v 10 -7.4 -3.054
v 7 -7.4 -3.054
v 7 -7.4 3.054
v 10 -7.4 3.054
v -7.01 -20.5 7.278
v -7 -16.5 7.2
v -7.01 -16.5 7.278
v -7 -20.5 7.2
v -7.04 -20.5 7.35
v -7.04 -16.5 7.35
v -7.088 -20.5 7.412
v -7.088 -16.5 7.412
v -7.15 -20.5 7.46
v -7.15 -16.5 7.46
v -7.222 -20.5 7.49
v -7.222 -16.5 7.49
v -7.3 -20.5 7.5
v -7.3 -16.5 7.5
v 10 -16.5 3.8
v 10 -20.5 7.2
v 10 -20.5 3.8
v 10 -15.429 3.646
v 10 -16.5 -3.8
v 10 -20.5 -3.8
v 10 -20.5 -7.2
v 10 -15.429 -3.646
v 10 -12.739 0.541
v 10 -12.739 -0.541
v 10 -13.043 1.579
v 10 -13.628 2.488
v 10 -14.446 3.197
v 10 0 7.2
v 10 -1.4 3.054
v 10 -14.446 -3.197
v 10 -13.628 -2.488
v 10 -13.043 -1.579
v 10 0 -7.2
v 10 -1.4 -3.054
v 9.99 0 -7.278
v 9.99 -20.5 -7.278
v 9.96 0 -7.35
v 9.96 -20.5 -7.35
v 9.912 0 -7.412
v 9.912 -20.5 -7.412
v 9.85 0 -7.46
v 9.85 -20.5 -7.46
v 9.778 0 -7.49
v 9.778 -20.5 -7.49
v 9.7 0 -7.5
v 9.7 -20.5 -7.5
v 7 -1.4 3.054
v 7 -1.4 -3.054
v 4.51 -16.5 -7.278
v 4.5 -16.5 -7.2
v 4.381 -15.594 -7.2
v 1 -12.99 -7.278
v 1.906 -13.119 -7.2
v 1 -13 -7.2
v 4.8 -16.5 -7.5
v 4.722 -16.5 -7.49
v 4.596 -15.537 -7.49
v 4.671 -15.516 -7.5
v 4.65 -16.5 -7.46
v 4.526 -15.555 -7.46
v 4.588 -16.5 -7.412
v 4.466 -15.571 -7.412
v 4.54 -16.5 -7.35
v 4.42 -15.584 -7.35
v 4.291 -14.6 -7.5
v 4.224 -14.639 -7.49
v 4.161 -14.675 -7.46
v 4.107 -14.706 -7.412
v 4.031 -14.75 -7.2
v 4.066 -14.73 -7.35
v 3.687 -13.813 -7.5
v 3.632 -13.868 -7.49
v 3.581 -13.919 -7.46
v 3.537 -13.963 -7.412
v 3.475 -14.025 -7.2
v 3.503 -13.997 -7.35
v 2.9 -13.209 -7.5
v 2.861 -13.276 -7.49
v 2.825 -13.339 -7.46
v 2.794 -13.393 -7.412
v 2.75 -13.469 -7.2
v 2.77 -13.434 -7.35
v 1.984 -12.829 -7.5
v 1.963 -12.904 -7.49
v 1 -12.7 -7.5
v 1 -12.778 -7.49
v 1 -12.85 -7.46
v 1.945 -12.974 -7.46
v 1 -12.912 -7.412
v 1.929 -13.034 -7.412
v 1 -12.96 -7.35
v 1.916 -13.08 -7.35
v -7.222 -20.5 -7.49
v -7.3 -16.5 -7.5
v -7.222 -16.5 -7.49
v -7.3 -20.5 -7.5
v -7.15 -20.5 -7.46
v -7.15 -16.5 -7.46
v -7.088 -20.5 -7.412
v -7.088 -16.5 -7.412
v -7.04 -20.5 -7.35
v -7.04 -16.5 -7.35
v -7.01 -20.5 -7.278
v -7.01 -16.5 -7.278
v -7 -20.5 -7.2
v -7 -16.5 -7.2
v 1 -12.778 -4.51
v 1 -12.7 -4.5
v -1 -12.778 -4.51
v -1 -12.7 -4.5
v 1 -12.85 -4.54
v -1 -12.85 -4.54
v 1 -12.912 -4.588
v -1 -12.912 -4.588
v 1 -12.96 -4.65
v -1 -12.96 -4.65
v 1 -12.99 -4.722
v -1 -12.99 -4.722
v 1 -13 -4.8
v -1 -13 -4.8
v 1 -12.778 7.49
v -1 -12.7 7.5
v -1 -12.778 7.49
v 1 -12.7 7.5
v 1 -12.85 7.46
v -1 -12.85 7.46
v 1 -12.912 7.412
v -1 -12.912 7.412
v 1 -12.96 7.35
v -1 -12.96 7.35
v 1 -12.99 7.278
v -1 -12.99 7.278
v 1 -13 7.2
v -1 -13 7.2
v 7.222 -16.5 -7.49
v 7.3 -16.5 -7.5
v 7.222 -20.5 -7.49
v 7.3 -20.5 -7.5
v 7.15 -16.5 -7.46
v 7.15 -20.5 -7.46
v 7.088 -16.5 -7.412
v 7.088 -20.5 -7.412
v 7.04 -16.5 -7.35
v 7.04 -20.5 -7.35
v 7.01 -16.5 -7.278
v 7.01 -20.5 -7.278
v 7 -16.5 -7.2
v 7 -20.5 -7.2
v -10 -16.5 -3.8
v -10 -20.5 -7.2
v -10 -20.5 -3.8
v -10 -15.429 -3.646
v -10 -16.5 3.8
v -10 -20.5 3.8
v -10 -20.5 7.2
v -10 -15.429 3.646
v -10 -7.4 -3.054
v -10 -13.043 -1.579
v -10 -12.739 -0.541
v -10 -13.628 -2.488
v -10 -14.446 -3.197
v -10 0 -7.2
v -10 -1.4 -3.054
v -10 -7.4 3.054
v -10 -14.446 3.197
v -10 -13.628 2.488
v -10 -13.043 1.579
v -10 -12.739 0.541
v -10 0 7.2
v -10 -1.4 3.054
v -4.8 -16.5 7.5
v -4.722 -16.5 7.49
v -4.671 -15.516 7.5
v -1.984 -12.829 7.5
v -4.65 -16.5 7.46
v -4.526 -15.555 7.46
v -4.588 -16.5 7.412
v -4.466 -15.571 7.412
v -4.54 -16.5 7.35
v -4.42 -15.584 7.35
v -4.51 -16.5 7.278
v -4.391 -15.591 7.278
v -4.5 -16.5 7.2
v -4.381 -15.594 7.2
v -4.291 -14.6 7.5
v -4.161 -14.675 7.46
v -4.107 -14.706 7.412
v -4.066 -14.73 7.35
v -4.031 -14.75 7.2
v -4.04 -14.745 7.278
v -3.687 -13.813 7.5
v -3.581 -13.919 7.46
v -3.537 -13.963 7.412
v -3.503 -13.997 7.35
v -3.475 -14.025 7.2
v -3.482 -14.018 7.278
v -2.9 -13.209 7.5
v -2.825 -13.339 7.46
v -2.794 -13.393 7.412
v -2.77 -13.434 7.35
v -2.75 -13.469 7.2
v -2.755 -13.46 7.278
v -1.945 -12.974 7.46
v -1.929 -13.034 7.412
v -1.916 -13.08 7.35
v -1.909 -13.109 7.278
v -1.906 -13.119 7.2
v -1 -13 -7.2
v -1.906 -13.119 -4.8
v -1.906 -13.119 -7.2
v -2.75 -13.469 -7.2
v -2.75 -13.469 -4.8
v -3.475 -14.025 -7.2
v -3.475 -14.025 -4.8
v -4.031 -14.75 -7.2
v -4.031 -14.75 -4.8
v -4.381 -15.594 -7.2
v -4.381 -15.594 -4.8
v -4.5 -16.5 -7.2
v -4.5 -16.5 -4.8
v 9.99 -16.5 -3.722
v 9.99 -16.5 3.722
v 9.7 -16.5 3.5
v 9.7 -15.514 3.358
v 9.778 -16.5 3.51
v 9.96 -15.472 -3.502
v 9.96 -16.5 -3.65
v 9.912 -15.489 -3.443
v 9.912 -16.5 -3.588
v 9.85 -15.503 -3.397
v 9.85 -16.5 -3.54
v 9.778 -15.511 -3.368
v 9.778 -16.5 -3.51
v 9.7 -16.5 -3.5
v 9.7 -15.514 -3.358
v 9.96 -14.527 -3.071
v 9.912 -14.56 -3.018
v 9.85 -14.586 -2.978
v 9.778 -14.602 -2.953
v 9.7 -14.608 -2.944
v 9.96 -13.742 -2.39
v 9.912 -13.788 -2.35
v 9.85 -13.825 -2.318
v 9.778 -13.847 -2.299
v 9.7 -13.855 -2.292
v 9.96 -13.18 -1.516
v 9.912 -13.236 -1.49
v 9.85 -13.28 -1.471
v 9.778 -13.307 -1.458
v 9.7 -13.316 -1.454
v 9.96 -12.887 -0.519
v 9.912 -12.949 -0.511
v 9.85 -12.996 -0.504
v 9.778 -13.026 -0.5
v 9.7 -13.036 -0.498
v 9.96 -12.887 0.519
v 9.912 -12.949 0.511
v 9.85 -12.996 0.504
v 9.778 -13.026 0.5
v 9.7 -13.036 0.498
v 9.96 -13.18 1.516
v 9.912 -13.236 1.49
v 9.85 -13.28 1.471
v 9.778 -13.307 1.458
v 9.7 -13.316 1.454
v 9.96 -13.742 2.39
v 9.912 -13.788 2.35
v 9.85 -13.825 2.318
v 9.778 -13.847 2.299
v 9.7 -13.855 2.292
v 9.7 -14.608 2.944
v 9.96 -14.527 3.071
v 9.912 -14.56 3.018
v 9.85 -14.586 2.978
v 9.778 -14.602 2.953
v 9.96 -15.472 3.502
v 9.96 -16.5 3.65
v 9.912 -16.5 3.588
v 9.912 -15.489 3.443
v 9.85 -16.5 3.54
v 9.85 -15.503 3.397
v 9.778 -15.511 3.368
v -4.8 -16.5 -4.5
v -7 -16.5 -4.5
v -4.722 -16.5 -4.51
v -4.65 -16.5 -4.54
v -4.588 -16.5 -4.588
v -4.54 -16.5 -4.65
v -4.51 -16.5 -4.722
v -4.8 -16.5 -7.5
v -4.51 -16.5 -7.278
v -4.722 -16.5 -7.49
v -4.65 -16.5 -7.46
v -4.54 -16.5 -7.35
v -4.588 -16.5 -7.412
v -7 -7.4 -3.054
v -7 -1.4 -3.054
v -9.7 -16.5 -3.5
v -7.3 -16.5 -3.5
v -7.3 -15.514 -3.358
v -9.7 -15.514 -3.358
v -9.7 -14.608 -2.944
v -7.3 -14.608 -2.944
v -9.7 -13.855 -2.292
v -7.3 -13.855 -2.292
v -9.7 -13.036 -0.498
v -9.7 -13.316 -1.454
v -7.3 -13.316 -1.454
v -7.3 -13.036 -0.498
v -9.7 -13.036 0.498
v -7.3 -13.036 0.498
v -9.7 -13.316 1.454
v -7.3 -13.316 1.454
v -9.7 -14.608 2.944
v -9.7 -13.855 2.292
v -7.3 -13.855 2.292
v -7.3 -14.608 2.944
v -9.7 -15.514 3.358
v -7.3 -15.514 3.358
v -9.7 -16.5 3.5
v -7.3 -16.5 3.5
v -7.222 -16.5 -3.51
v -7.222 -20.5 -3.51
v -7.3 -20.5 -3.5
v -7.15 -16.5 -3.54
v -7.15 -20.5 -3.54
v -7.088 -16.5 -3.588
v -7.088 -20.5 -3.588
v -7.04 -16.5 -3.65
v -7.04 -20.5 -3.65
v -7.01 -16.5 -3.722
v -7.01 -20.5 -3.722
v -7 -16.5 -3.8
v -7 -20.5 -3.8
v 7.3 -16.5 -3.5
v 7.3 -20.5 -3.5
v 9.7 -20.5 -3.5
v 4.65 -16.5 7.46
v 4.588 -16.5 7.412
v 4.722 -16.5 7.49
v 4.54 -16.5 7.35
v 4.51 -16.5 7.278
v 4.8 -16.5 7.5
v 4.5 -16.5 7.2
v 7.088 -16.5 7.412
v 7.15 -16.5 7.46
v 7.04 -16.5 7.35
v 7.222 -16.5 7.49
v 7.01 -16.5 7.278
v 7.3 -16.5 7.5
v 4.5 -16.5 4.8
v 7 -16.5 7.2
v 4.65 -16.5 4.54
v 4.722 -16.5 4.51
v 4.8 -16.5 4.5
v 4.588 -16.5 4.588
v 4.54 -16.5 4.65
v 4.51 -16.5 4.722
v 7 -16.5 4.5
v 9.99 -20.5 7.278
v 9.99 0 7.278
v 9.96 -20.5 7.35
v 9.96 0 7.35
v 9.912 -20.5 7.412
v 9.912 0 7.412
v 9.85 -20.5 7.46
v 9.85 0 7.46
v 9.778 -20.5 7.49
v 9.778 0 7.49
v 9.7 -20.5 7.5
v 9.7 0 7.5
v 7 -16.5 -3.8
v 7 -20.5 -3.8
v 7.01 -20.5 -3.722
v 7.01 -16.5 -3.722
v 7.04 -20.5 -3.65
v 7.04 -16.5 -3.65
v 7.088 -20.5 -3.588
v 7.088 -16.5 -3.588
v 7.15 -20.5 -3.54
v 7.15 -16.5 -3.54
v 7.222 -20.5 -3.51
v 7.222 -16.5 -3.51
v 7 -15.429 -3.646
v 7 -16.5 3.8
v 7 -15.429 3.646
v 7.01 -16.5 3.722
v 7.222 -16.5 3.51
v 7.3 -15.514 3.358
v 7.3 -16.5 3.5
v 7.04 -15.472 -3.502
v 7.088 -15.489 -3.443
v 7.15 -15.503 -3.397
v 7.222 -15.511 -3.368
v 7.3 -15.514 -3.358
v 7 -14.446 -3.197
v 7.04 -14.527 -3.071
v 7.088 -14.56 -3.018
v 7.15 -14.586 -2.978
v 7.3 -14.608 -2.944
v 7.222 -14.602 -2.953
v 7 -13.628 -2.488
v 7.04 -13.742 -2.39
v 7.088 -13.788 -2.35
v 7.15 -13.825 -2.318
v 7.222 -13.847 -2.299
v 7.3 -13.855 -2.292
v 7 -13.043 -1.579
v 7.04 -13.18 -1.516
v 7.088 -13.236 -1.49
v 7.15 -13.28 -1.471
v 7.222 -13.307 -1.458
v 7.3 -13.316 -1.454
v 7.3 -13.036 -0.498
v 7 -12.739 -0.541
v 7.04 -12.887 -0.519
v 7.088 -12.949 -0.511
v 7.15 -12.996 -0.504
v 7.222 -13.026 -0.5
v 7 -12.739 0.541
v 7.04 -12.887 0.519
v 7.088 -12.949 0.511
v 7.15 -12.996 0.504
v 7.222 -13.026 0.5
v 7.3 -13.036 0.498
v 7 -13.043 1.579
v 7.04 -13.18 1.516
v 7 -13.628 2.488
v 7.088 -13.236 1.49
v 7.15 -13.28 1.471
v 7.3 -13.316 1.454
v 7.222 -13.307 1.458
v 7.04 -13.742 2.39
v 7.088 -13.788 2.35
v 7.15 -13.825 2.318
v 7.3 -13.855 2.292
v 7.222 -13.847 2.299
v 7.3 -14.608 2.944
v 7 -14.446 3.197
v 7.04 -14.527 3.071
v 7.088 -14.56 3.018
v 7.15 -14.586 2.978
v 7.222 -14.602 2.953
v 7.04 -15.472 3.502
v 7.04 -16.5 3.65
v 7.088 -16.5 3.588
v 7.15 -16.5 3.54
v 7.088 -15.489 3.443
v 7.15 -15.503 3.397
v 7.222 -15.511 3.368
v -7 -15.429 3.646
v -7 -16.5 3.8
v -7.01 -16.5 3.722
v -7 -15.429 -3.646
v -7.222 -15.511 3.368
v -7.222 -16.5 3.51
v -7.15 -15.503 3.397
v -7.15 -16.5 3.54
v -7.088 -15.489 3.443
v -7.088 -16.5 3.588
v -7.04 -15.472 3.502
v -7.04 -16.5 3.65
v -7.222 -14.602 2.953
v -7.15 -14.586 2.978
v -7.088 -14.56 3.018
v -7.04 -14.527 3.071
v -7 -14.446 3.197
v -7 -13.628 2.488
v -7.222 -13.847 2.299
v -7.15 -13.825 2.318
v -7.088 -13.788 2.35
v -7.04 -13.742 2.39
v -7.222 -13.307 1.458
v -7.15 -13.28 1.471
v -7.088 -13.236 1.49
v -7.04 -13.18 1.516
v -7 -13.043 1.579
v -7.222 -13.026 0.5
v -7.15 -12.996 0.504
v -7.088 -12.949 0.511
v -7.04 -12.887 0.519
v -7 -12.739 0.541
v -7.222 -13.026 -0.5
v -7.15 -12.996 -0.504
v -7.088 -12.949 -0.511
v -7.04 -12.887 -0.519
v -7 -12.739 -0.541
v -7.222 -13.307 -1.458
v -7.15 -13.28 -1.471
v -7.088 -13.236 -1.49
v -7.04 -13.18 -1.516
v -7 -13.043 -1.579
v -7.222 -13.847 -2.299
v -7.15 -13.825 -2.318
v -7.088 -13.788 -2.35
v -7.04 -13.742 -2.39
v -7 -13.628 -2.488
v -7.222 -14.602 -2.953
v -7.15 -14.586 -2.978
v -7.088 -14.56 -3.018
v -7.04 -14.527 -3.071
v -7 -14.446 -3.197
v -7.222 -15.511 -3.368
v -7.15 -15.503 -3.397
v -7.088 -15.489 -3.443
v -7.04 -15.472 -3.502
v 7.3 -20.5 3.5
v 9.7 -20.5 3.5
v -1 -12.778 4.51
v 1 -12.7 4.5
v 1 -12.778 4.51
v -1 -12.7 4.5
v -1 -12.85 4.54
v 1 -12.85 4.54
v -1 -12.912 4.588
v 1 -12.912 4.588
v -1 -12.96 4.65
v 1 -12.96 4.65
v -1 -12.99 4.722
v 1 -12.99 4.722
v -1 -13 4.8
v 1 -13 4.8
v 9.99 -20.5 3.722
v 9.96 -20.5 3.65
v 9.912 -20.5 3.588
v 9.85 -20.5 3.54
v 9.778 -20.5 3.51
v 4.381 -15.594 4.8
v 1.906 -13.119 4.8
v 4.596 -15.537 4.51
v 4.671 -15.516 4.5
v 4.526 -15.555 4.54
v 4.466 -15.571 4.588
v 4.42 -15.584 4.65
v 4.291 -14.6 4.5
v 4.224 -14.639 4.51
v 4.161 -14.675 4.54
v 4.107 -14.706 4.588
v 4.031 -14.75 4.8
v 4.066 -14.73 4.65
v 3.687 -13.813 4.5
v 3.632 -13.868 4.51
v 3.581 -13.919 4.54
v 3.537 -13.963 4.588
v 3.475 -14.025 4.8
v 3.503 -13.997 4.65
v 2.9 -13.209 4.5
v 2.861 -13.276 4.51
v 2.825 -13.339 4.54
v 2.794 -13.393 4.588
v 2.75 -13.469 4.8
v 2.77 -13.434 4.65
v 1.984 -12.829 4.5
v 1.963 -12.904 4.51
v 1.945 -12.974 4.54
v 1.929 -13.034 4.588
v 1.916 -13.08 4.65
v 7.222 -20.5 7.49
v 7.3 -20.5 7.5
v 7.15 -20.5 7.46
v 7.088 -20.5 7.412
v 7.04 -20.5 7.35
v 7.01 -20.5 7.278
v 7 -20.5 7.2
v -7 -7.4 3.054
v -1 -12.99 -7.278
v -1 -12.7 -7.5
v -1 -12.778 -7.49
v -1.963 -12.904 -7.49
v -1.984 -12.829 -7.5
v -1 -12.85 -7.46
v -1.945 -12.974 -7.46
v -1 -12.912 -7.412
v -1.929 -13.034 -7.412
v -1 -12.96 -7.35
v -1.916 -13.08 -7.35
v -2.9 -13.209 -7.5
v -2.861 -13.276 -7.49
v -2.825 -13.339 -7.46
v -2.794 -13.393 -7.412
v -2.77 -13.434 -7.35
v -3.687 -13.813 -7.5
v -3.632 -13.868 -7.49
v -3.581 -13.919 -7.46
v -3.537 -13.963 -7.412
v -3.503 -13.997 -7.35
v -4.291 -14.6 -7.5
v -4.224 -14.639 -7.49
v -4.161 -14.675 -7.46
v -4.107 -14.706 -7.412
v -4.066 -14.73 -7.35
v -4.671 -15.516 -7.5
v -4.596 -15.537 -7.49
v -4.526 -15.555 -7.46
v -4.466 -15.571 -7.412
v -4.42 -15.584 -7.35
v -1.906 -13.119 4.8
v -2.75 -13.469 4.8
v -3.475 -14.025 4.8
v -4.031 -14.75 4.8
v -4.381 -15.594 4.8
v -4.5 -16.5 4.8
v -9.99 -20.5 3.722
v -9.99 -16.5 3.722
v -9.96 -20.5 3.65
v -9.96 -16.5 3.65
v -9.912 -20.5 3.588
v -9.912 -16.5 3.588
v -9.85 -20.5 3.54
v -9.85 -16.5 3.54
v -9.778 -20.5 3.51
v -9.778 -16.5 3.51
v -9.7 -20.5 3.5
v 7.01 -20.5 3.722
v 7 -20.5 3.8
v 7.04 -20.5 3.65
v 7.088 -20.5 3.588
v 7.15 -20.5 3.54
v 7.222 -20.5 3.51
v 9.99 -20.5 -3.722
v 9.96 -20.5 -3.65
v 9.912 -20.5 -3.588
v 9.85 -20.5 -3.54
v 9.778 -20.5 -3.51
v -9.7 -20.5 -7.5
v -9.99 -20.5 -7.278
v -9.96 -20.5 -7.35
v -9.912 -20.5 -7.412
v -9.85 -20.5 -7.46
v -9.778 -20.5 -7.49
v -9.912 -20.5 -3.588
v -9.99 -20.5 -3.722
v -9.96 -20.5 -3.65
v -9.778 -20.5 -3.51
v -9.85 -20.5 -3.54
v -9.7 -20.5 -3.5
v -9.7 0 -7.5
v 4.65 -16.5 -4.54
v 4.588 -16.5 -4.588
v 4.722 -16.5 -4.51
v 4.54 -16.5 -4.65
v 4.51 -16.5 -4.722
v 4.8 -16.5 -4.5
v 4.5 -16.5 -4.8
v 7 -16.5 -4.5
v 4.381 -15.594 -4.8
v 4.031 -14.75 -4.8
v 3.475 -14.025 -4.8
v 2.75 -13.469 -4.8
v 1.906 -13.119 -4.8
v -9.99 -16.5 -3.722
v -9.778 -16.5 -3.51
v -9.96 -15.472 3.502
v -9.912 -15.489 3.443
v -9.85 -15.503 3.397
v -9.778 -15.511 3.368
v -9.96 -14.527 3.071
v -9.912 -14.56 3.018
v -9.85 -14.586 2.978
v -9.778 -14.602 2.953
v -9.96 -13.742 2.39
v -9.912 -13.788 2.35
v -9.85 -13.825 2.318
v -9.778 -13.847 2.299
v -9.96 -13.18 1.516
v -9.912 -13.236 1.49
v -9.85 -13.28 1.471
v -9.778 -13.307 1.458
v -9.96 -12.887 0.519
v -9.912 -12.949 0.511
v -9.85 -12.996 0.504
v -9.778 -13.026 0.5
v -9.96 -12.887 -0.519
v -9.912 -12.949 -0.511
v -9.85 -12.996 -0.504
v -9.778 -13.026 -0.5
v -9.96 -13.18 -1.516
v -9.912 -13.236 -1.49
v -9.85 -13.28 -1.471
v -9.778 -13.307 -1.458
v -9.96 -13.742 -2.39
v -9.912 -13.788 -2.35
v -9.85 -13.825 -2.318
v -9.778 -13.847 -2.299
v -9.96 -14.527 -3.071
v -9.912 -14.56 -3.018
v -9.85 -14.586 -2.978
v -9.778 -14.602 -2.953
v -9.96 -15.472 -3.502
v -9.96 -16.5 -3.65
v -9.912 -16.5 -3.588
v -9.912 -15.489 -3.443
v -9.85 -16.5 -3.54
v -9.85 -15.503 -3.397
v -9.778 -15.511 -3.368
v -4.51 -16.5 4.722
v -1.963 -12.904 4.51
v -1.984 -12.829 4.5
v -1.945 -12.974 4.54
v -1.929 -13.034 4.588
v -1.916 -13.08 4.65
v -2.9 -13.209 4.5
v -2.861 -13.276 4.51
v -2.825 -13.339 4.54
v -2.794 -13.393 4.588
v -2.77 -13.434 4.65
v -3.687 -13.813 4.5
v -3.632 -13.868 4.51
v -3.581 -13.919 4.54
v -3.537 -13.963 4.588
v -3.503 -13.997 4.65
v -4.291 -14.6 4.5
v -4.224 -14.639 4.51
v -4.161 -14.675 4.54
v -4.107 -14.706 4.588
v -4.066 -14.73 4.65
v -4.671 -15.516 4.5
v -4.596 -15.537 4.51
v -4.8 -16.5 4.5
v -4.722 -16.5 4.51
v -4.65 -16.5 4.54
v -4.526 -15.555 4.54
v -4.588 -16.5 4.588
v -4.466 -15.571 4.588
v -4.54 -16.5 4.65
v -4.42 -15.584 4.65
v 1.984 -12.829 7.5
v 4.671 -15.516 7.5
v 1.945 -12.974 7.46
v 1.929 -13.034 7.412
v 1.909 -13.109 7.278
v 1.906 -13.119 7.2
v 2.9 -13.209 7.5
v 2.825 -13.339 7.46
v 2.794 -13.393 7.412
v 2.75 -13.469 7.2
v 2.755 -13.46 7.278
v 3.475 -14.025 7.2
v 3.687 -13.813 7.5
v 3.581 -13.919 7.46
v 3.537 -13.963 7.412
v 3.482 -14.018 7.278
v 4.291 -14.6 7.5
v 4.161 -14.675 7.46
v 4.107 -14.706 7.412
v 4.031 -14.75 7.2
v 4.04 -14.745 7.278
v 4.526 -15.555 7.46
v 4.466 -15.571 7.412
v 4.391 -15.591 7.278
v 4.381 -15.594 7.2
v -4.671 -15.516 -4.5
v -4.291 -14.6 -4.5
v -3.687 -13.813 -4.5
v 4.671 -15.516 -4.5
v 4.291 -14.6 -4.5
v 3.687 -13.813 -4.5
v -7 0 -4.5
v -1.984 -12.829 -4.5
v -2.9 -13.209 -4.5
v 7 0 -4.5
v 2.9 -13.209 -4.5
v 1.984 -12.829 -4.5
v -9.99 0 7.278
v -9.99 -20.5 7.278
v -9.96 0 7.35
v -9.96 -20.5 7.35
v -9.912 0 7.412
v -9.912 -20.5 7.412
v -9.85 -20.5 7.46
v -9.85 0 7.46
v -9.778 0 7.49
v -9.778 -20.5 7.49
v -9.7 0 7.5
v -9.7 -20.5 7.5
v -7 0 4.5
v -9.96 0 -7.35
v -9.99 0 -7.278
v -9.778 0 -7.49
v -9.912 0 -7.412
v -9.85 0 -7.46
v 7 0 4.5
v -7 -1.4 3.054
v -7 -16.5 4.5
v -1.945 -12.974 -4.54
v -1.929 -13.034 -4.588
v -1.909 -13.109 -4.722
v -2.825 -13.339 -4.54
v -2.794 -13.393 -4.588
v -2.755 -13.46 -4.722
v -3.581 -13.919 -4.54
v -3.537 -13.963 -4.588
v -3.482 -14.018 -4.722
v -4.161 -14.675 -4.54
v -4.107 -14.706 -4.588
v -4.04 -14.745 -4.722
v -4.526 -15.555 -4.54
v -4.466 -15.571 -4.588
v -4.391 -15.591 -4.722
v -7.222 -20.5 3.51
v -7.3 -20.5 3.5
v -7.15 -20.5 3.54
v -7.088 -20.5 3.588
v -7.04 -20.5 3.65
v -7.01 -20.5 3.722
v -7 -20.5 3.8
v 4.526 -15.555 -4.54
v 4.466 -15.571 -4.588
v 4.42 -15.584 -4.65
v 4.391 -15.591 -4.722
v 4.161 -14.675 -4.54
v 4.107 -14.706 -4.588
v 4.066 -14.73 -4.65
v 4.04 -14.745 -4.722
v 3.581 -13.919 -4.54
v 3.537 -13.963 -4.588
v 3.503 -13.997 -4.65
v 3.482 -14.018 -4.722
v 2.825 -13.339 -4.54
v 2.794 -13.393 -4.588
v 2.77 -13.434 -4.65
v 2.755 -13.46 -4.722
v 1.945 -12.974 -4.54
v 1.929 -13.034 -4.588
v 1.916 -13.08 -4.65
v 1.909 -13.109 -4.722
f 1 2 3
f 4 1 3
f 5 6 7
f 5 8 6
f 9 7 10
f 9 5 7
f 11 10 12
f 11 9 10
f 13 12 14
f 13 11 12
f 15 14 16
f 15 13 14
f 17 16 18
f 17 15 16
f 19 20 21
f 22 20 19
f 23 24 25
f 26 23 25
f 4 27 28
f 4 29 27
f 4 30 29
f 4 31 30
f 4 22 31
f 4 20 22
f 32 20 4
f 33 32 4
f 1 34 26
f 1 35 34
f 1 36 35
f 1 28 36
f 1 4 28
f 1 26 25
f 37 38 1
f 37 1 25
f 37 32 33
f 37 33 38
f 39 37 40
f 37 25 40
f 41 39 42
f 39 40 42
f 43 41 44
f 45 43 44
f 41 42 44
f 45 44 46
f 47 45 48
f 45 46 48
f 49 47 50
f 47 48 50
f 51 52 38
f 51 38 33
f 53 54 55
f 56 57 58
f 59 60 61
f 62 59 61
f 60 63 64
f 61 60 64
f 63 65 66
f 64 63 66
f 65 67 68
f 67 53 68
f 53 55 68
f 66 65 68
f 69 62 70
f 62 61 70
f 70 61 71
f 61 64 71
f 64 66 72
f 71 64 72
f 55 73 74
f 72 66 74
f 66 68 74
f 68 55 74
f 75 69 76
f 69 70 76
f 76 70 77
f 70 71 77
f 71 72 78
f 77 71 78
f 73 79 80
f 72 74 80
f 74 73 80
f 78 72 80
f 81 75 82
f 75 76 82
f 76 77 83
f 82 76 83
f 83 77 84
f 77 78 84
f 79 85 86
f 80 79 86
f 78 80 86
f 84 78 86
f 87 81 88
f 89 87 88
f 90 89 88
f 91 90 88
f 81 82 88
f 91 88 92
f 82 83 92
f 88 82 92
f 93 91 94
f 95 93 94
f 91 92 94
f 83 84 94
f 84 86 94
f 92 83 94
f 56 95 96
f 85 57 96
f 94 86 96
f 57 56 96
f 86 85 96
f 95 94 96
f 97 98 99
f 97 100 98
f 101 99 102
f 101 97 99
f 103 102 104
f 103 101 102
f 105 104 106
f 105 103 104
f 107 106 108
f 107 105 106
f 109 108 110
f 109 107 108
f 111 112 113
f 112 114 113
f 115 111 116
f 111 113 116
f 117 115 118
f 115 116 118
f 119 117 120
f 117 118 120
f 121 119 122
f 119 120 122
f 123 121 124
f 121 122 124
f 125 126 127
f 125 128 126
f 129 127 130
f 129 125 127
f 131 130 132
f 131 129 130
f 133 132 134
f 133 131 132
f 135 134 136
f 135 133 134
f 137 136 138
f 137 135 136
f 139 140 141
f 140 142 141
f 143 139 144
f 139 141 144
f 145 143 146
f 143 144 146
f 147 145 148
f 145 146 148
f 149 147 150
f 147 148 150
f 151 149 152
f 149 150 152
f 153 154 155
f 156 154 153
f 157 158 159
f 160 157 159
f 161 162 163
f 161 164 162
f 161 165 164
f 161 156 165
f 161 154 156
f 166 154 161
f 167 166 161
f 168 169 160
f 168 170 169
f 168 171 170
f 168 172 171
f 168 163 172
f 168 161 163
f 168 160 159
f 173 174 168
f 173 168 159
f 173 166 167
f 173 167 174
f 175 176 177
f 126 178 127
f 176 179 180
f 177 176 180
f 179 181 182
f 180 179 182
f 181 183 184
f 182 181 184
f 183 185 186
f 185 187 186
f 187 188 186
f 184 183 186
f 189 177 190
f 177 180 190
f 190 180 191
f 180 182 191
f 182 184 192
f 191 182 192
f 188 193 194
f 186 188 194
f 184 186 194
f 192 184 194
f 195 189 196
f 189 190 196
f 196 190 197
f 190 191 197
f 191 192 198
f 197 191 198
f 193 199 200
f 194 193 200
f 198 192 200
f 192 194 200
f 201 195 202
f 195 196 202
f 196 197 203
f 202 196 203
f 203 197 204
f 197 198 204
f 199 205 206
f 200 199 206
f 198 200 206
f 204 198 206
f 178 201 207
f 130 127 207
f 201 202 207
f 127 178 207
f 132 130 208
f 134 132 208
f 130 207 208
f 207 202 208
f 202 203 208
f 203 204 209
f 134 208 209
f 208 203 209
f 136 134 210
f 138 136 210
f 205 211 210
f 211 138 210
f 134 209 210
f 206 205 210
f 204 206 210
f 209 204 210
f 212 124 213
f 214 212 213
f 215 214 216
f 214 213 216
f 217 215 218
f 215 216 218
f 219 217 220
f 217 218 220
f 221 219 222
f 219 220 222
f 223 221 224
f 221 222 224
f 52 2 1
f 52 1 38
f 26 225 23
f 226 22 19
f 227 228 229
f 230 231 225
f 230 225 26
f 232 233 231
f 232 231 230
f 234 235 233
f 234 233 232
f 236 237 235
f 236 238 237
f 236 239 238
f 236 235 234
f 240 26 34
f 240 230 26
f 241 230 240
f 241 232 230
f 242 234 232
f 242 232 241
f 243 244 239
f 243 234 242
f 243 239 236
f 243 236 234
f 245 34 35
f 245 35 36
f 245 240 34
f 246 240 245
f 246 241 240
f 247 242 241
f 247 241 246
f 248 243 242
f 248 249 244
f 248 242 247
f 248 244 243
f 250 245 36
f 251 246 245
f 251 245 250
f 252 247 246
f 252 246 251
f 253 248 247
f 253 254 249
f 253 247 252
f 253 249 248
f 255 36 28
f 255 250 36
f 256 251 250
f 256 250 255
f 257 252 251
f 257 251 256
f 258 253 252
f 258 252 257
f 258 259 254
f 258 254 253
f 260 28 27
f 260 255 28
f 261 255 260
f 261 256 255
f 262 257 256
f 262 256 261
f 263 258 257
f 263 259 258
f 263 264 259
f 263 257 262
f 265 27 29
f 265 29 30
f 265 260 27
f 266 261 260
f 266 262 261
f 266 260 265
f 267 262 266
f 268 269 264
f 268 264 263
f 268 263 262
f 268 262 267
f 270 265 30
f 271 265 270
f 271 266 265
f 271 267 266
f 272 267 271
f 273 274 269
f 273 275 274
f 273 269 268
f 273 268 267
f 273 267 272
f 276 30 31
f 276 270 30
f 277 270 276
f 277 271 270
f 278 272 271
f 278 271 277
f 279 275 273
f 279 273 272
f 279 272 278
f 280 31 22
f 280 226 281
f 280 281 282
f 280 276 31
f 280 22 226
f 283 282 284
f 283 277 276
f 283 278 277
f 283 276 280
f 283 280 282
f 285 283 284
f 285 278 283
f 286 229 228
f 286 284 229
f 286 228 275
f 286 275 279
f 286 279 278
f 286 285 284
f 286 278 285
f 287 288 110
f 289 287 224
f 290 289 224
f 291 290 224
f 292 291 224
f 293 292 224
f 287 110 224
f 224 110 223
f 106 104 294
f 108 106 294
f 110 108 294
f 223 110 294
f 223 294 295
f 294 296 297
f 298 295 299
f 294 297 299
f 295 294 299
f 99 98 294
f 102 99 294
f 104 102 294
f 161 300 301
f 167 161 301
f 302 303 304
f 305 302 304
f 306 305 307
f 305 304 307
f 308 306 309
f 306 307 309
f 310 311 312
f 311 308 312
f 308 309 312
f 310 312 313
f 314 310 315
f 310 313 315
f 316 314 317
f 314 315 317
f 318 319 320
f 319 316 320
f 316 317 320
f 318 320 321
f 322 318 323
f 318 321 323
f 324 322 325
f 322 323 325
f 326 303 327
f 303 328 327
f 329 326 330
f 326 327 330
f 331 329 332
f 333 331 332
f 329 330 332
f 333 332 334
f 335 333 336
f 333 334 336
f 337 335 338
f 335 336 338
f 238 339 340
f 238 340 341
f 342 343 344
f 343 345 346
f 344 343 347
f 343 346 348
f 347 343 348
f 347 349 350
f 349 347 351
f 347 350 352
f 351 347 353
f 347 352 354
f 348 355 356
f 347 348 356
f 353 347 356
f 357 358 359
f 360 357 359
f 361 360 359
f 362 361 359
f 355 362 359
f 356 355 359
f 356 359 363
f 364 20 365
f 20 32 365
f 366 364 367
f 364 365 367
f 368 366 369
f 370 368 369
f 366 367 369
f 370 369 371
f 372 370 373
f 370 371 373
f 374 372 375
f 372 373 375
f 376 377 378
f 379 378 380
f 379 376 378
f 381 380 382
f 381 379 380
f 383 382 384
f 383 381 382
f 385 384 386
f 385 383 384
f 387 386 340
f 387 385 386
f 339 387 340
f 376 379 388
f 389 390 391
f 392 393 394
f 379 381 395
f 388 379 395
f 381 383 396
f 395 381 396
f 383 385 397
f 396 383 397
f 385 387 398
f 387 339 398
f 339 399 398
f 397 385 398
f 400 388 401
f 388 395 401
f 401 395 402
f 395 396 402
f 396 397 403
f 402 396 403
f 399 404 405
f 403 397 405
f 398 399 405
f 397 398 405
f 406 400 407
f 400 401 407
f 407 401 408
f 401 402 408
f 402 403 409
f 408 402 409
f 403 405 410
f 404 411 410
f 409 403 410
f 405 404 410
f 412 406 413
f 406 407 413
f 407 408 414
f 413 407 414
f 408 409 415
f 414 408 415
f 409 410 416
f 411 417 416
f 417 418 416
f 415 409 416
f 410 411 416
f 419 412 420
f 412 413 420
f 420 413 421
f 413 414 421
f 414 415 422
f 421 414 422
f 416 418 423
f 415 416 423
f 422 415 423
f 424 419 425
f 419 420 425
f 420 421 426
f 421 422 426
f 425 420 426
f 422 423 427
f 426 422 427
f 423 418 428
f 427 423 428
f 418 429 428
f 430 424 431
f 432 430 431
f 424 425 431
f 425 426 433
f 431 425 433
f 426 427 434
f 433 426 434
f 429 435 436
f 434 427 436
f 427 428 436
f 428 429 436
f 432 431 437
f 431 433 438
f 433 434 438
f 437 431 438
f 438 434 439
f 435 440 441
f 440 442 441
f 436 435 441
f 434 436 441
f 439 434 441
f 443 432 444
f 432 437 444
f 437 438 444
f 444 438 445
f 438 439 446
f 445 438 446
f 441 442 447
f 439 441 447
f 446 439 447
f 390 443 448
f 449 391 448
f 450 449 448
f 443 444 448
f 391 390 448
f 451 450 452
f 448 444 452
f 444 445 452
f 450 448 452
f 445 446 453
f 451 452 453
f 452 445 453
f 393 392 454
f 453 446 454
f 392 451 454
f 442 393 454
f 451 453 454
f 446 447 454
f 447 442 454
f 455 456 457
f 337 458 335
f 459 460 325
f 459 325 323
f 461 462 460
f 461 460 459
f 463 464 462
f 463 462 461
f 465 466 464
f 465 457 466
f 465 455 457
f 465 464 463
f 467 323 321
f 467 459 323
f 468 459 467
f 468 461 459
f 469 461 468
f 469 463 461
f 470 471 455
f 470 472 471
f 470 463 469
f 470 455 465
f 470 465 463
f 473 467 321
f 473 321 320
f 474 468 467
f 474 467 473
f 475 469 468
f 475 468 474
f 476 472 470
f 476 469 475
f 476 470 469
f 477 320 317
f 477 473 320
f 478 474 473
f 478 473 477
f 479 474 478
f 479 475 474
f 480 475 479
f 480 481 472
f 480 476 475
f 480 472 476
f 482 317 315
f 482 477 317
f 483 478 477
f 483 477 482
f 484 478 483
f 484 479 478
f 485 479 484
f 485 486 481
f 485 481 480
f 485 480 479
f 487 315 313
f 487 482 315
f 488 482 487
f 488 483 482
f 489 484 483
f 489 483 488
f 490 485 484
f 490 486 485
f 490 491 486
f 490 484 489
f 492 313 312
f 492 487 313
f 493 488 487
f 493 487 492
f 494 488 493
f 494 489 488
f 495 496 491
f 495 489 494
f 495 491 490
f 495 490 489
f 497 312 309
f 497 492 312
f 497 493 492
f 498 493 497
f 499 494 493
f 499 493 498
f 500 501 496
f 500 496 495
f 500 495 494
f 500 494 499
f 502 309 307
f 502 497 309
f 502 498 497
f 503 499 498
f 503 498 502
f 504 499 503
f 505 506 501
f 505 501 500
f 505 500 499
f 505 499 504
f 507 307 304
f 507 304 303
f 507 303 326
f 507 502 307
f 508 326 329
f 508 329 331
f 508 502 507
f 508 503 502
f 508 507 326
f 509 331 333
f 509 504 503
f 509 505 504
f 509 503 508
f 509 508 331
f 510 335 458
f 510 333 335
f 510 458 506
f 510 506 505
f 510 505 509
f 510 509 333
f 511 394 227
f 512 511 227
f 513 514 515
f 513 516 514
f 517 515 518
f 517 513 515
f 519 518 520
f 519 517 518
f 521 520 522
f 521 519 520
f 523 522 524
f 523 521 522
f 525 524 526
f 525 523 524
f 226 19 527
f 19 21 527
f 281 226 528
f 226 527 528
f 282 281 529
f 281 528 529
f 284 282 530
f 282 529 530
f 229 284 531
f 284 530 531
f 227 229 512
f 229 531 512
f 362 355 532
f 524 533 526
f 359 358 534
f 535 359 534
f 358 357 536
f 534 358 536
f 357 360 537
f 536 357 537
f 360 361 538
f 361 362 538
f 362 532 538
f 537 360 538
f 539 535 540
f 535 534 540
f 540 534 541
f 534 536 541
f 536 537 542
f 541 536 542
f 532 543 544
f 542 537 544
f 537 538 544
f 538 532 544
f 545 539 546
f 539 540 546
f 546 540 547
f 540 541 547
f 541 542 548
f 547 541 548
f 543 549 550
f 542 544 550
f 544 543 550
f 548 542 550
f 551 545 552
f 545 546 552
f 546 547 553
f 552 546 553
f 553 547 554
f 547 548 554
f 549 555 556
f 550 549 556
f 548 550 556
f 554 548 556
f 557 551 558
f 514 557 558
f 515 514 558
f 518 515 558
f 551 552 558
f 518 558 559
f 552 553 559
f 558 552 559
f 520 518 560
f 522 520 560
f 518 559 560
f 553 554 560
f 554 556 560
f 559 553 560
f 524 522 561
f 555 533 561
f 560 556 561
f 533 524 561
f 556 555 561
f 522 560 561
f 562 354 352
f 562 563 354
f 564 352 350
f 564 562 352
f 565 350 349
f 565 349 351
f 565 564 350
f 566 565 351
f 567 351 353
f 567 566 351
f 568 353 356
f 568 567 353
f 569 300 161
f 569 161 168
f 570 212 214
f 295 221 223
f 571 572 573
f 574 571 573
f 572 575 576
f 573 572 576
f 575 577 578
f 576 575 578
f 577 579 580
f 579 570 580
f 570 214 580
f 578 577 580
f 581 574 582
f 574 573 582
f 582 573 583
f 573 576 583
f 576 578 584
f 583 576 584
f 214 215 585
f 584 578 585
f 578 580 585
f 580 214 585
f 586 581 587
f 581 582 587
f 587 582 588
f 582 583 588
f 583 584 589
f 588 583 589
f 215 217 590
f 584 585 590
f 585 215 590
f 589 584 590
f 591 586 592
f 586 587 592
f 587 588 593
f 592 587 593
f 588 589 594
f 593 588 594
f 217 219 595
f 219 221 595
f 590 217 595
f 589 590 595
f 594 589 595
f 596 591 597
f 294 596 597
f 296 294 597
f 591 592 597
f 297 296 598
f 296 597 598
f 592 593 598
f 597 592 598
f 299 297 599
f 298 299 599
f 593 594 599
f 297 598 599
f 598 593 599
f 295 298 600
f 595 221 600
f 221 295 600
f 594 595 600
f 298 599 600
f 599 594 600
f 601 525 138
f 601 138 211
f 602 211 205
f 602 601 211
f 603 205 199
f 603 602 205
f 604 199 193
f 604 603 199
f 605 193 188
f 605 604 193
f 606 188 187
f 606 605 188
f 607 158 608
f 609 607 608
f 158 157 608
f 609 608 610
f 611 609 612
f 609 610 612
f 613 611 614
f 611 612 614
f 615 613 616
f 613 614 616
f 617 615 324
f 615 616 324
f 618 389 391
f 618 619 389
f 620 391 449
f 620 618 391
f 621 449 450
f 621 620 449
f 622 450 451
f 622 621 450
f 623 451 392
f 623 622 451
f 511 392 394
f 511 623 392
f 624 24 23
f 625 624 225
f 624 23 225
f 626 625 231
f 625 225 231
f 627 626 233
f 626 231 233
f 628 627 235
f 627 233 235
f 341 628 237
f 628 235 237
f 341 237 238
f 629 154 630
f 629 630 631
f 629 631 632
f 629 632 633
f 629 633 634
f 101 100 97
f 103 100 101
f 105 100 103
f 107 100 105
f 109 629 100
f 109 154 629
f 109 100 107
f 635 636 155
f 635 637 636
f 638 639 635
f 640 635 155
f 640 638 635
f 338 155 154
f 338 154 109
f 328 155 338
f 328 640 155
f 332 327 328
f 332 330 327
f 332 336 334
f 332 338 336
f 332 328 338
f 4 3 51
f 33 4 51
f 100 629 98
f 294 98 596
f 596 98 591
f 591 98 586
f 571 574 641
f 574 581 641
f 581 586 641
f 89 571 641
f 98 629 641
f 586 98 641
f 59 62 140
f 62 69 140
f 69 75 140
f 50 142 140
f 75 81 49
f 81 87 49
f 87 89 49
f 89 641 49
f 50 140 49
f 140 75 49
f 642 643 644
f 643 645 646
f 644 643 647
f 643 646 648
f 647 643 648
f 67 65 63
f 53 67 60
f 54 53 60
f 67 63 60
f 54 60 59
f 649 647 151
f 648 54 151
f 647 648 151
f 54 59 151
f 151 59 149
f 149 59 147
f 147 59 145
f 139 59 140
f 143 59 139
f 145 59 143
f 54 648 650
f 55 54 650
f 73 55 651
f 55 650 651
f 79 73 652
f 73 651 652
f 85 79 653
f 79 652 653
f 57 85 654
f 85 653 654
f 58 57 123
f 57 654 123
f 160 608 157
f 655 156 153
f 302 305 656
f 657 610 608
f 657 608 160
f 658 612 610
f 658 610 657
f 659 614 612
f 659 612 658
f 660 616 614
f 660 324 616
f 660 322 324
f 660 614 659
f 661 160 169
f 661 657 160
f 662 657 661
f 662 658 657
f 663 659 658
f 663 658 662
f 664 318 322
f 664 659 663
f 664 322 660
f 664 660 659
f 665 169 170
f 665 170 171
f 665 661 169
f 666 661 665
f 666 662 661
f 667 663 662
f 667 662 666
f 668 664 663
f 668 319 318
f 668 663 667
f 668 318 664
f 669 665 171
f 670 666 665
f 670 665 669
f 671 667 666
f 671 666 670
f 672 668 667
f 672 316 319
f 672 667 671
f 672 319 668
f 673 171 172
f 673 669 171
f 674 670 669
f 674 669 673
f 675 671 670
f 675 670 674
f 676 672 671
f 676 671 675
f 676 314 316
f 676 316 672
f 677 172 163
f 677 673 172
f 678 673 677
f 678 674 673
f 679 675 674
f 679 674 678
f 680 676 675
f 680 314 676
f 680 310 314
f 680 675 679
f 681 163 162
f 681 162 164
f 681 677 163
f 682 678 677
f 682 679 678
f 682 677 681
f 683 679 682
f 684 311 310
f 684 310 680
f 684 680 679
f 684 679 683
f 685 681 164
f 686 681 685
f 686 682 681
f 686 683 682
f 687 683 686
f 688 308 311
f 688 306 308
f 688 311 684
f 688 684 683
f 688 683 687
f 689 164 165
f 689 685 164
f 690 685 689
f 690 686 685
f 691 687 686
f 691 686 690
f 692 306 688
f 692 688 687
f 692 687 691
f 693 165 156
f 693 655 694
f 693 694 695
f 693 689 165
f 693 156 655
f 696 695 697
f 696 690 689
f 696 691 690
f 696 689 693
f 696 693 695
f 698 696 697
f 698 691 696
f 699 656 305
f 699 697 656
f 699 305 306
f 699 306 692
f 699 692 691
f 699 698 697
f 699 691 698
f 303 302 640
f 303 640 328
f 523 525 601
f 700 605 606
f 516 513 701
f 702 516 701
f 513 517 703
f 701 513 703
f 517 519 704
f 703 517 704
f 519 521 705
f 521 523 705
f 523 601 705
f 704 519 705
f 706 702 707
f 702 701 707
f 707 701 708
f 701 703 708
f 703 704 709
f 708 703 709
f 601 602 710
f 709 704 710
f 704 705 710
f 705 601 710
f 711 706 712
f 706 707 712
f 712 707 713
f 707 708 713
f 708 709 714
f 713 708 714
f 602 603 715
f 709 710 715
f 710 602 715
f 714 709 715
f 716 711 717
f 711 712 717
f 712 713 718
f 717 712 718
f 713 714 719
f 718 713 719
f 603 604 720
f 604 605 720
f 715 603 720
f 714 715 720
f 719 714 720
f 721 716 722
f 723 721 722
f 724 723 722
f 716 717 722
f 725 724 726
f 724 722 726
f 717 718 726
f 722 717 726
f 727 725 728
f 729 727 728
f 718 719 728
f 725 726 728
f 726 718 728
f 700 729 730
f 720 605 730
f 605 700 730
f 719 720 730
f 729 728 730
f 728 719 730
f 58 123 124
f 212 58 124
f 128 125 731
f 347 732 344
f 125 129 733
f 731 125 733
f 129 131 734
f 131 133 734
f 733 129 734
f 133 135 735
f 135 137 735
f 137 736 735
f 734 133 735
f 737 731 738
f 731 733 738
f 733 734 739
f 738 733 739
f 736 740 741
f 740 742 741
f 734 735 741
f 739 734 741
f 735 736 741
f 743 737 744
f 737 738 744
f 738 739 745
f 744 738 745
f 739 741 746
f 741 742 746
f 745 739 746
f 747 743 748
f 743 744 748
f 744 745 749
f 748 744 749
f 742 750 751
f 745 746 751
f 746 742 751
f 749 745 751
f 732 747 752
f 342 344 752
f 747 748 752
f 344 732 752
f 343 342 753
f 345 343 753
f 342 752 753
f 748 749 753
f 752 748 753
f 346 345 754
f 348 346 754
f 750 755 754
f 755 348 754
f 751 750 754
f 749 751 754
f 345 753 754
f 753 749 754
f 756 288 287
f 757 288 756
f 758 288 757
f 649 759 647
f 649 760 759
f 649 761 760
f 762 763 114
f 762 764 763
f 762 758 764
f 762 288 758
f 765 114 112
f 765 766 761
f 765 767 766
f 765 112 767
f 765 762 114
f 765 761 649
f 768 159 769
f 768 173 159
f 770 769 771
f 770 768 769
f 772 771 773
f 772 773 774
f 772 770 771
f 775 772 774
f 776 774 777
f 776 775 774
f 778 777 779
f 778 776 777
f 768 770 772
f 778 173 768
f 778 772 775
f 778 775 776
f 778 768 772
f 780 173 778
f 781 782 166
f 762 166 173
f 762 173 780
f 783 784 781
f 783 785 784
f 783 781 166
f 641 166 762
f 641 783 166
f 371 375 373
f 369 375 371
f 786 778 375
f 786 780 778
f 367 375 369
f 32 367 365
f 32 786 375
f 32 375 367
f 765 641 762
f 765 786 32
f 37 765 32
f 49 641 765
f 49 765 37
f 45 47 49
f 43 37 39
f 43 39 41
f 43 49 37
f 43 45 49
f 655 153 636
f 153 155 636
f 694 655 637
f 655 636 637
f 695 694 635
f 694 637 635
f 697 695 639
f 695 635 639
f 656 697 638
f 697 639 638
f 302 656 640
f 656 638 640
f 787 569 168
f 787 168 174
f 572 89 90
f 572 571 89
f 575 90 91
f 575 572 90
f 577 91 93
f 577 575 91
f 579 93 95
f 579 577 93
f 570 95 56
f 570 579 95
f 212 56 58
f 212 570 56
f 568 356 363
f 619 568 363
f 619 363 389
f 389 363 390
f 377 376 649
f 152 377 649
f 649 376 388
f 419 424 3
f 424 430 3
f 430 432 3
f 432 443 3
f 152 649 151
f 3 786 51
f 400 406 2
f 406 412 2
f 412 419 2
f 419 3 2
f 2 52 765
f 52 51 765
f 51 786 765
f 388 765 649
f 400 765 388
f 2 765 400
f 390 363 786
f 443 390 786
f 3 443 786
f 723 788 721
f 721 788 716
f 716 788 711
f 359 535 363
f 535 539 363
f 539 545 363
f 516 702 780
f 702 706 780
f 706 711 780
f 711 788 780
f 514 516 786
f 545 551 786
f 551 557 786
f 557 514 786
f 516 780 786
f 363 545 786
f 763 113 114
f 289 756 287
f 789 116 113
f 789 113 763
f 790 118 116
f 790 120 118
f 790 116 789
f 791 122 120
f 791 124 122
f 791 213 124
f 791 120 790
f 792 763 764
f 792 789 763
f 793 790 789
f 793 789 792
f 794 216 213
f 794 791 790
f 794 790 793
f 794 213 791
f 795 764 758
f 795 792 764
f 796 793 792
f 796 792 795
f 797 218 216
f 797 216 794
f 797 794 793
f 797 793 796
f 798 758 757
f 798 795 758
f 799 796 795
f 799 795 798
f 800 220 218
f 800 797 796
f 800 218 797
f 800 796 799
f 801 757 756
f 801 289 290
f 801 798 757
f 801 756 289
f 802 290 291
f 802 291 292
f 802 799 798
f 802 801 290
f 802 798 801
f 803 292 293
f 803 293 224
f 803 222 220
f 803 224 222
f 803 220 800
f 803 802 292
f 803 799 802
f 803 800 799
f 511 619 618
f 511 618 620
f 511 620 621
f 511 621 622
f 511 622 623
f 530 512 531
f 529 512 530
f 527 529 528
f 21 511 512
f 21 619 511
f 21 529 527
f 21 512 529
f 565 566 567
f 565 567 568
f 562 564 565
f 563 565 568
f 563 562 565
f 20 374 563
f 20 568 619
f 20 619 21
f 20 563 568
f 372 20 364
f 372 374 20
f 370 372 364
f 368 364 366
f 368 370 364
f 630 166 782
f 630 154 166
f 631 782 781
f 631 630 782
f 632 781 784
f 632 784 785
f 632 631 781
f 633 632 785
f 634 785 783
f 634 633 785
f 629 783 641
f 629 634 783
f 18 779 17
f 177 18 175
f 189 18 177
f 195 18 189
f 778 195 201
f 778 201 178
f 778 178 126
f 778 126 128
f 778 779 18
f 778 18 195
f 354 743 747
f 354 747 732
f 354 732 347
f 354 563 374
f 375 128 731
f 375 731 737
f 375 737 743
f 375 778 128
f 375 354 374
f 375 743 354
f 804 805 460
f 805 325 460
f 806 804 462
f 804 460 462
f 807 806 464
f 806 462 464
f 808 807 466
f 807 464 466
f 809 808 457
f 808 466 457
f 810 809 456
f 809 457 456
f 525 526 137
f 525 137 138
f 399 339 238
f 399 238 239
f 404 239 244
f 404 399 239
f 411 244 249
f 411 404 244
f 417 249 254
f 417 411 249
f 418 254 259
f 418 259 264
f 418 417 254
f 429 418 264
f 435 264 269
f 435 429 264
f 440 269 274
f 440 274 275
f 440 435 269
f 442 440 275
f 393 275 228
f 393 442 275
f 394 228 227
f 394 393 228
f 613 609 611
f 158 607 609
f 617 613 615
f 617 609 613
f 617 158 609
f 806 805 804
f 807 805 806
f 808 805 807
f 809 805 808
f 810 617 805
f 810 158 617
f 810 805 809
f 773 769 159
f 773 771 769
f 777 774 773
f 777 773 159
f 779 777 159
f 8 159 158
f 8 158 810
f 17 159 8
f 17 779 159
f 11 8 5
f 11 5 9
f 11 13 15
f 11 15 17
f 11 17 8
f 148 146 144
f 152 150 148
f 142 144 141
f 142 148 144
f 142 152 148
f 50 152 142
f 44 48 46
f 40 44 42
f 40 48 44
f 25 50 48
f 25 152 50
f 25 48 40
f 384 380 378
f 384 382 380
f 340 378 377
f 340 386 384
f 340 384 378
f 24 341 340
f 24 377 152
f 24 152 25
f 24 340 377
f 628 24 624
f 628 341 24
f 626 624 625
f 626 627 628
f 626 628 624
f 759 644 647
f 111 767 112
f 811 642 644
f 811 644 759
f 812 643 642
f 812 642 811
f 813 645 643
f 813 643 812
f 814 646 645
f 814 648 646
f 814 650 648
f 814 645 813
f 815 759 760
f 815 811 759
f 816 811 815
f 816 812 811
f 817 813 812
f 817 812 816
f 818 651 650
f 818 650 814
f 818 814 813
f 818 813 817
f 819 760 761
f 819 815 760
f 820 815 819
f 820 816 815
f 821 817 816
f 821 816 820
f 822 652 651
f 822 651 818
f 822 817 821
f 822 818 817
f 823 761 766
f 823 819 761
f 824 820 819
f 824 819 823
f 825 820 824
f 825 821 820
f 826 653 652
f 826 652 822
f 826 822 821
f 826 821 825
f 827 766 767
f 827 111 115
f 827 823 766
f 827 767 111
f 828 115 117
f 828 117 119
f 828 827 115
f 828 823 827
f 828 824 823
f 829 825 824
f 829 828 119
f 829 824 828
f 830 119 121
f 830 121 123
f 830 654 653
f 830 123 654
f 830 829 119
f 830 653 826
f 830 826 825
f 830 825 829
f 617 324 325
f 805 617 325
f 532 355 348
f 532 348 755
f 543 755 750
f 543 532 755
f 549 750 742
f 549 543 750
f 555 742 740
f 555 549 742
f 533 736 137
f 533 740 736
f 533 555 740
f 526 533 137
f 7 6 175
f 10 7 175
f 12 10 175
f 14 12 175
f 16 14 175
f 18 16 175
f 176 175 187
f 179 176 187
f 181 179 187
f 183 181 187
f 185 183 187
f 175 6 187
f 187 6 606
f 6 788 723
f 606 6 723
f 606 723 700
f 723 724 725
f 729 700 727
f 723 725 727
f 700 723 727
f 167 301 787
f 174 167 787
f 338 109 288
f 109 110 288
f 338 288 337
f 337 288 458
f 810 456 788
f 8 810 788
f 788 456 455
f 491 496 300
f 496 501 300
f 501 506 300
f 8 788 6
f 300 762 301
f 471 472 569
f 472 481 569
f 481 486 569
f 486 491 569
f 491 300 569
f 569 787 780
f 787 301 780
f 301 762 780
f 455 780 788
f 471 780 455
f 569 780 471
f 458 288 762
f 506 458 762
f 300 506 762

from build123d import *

# Parameters (mm, degrees)
SKETCH_1_W               = 20
SKETCH_1_H               = 15
SKETCH_1_W_2             = 14
SKETCH_1_H_2             = 9
EXTRUDE_1_DEPTH          = 16.5
SKETCH_2_W               = 6.10870136
SKETCH_2_H               = 6
CUT_EXTRUDE_1_DEPTH      = 18
CUT_EXTRUDE_1_DEPTH_BACK = 4
CUT_EXTRUDE_2_DEPTH      = 13
CUT_EXTRUDE_2_DEPTH_BACK = 4
SKETCH_5_R               = 3.5
CUT_EXTRUDE_3_DEPTH      = 18
CUT_EXTRUDE_3_DEPTH_BACK = 4
SKETCH_6_W               = 3
SKETCH_6_H               = 4
EXTRUDE_2_DEPTH          = 4
FILLET_1_R               = 0.3
FILLET_2_R               = 0.3


with BuildPart() as part:
    # Эскиз1 → Бобышка-Вытянуть1 (new body)
    with BuildSketch(Plane(origin=(0, 0, 0), x_dir=(1, 0, 0), z_dir=(0, 1, 0))):
        Rectangle(SKETCH_1_W, SKETCH_1_H)
        Rectangle(SKETCH_1_W_2, SKETCH_1_H_2, mode=Mode.SUBTRACT)
    extrude(amount=-EXTRUDE_1_DEPTH)

    # Эскиз2 → Вырез-Вытянуть1 (cut, two sides)
    with BuildSketch(Plane.ZY.offset(-7)) as cut_extrude_1_sk:
        with Locations((0, -4.4)):
            Rectangle(SKETCH_2_W, SKETCH_2_H)
    extrude(amount=CUT_EXTRUDE_1_DEPTH, mode=Mode.SUBTRACT)
    extrude(cut_extrude_1_sk.sketch, amount=-CUT_EXTRUDE_1_DEPTH_BACK, mode=Mode.SUBTRACT)

    # Эскиз4 → Вырез-Вытянуть2 (cut, two sides)
    with BuildSketch(Plane(origin=(0, 0, 4.5), x_dir=(-1, 0, 0), z_dir=(0, 0, -1))) as cut_extrude_2_sk:
        with BuildLine():
            Line((-1, -13), (1, -13))
            ThreePointArc((1, -13), (4.5, -16.5), (1, -20))
            Line((1, -20), (-1, -20))
            ThreePointArc((-1, -20), (-4.5, -16.5), (-1, -13))
        make_face()
    extrude(amount=CUT_EXTRUDE_2_DEPTH, mode=Mode.SUBTRACT)
    extrude(cut_extrude_2_sk.sketch, amount=-CUT_EXTRUDE_2_DEPTH_BACK, mode=Mode.SUBTRACT)

    # Эскиз5 → Вырез-Вытянуть3 (cut, two sides)
    with BuildSketch(Plane(origin=(-7, 0, 0), x_dir=(0, 0, -1), z_dir=(1, 0, 0))) as cut_extrude_3_sk:
        with Locations((0, -16.5)):
            Circle(SKETCH_5_R)
    extrude(amount=CUT_EXTRUDE_3_DEPTH, mode=Mode.SUBTRACT)
    extrude(cut_extrude_3_sk.sketch, amount=-CUT_EXTRUDE_3_DEPTH_BACK, mode=Mode.SUBTRACT)

    # Эскиз6 → Бобышка-Вытянуть2 (add)
    with BuildSketch(Plane.XZ.offset(16.5)):
        with Locations((-8.5, -5.5)):
            Rectangle(SKETCH_6_W, SKETCH_6_H)
        with Locations((-8.5, 5.5)):
            Rectangle(SKETCH_6_W, SKETCH_6_H)
        with Locations((8.5, 5.5)):
            Rectangle(SKETCH_6_W, SKETCH_6_H)
        with Locations((8.5, -5.5)):
            Rectangle(SKETCH_6_W, SKETCH_6_H)
    extrude(amount=EXTRUDE_2_DEPTH)

    # Скругление1
    fillet_1_edges = [part.edges().sort_by_distance(p)[0] for p in [
        (-10, -10.25, -7.5),
        (10, -10.25, -7.5),
        (10, -10.25, 7.5),
        (-10, -10.25, 7.5),
    ]]
    fillet(fillet_1_edges, radius=FILLET_1_R)

    # Скругление2
    fillet_2_edges = [part.edges().sort_by_distance(p)[0] for p in [
        (-10, -18.5, -3.5),
        (-7, -18.5, -7.5),
        (-7, -18.5, -3.5),
        (-7, -18.5, 3.5),
        (-7, -18.5, 7.5),
        (-10, -18.5, 3.5),
        (7, -18.5, 7.5),
        (7, -18.5, 3.5),
        (10, -18.5, 3.5),
        (7, -18.5, -3.5),
        (7, -18.5, -7.5),
        (10, -18.5, -3.5),
        (-3.474873734, -14.025126266, 4.5),
        (0, -13, 4.5),
        (3.474873734, -14.025126266, 4.5),
        (0, -13, 7.5),
        (3.474873734, -14.025126266, -7.5),
        (-3.474873734, -14.025126266, -7.5),
        (3.474873734, -14.025126266, -4.5),
        (3.474873734, -14.025126266, 7.5),
        (0, -13, -7.5),
        (-3.474873734, -14.025126266, -4.5),
        (-3.474873734, -14.025126266, 7.5),
        (0, -13, -4.5),
        (7, -13, 0),
        (10, -13, 0),
        (-10, -13, 0),
        (-7, -13, 0),
    ]]
    fillet(fillet_2_edges, radius=FILLET_2_R)


solid = part.part
